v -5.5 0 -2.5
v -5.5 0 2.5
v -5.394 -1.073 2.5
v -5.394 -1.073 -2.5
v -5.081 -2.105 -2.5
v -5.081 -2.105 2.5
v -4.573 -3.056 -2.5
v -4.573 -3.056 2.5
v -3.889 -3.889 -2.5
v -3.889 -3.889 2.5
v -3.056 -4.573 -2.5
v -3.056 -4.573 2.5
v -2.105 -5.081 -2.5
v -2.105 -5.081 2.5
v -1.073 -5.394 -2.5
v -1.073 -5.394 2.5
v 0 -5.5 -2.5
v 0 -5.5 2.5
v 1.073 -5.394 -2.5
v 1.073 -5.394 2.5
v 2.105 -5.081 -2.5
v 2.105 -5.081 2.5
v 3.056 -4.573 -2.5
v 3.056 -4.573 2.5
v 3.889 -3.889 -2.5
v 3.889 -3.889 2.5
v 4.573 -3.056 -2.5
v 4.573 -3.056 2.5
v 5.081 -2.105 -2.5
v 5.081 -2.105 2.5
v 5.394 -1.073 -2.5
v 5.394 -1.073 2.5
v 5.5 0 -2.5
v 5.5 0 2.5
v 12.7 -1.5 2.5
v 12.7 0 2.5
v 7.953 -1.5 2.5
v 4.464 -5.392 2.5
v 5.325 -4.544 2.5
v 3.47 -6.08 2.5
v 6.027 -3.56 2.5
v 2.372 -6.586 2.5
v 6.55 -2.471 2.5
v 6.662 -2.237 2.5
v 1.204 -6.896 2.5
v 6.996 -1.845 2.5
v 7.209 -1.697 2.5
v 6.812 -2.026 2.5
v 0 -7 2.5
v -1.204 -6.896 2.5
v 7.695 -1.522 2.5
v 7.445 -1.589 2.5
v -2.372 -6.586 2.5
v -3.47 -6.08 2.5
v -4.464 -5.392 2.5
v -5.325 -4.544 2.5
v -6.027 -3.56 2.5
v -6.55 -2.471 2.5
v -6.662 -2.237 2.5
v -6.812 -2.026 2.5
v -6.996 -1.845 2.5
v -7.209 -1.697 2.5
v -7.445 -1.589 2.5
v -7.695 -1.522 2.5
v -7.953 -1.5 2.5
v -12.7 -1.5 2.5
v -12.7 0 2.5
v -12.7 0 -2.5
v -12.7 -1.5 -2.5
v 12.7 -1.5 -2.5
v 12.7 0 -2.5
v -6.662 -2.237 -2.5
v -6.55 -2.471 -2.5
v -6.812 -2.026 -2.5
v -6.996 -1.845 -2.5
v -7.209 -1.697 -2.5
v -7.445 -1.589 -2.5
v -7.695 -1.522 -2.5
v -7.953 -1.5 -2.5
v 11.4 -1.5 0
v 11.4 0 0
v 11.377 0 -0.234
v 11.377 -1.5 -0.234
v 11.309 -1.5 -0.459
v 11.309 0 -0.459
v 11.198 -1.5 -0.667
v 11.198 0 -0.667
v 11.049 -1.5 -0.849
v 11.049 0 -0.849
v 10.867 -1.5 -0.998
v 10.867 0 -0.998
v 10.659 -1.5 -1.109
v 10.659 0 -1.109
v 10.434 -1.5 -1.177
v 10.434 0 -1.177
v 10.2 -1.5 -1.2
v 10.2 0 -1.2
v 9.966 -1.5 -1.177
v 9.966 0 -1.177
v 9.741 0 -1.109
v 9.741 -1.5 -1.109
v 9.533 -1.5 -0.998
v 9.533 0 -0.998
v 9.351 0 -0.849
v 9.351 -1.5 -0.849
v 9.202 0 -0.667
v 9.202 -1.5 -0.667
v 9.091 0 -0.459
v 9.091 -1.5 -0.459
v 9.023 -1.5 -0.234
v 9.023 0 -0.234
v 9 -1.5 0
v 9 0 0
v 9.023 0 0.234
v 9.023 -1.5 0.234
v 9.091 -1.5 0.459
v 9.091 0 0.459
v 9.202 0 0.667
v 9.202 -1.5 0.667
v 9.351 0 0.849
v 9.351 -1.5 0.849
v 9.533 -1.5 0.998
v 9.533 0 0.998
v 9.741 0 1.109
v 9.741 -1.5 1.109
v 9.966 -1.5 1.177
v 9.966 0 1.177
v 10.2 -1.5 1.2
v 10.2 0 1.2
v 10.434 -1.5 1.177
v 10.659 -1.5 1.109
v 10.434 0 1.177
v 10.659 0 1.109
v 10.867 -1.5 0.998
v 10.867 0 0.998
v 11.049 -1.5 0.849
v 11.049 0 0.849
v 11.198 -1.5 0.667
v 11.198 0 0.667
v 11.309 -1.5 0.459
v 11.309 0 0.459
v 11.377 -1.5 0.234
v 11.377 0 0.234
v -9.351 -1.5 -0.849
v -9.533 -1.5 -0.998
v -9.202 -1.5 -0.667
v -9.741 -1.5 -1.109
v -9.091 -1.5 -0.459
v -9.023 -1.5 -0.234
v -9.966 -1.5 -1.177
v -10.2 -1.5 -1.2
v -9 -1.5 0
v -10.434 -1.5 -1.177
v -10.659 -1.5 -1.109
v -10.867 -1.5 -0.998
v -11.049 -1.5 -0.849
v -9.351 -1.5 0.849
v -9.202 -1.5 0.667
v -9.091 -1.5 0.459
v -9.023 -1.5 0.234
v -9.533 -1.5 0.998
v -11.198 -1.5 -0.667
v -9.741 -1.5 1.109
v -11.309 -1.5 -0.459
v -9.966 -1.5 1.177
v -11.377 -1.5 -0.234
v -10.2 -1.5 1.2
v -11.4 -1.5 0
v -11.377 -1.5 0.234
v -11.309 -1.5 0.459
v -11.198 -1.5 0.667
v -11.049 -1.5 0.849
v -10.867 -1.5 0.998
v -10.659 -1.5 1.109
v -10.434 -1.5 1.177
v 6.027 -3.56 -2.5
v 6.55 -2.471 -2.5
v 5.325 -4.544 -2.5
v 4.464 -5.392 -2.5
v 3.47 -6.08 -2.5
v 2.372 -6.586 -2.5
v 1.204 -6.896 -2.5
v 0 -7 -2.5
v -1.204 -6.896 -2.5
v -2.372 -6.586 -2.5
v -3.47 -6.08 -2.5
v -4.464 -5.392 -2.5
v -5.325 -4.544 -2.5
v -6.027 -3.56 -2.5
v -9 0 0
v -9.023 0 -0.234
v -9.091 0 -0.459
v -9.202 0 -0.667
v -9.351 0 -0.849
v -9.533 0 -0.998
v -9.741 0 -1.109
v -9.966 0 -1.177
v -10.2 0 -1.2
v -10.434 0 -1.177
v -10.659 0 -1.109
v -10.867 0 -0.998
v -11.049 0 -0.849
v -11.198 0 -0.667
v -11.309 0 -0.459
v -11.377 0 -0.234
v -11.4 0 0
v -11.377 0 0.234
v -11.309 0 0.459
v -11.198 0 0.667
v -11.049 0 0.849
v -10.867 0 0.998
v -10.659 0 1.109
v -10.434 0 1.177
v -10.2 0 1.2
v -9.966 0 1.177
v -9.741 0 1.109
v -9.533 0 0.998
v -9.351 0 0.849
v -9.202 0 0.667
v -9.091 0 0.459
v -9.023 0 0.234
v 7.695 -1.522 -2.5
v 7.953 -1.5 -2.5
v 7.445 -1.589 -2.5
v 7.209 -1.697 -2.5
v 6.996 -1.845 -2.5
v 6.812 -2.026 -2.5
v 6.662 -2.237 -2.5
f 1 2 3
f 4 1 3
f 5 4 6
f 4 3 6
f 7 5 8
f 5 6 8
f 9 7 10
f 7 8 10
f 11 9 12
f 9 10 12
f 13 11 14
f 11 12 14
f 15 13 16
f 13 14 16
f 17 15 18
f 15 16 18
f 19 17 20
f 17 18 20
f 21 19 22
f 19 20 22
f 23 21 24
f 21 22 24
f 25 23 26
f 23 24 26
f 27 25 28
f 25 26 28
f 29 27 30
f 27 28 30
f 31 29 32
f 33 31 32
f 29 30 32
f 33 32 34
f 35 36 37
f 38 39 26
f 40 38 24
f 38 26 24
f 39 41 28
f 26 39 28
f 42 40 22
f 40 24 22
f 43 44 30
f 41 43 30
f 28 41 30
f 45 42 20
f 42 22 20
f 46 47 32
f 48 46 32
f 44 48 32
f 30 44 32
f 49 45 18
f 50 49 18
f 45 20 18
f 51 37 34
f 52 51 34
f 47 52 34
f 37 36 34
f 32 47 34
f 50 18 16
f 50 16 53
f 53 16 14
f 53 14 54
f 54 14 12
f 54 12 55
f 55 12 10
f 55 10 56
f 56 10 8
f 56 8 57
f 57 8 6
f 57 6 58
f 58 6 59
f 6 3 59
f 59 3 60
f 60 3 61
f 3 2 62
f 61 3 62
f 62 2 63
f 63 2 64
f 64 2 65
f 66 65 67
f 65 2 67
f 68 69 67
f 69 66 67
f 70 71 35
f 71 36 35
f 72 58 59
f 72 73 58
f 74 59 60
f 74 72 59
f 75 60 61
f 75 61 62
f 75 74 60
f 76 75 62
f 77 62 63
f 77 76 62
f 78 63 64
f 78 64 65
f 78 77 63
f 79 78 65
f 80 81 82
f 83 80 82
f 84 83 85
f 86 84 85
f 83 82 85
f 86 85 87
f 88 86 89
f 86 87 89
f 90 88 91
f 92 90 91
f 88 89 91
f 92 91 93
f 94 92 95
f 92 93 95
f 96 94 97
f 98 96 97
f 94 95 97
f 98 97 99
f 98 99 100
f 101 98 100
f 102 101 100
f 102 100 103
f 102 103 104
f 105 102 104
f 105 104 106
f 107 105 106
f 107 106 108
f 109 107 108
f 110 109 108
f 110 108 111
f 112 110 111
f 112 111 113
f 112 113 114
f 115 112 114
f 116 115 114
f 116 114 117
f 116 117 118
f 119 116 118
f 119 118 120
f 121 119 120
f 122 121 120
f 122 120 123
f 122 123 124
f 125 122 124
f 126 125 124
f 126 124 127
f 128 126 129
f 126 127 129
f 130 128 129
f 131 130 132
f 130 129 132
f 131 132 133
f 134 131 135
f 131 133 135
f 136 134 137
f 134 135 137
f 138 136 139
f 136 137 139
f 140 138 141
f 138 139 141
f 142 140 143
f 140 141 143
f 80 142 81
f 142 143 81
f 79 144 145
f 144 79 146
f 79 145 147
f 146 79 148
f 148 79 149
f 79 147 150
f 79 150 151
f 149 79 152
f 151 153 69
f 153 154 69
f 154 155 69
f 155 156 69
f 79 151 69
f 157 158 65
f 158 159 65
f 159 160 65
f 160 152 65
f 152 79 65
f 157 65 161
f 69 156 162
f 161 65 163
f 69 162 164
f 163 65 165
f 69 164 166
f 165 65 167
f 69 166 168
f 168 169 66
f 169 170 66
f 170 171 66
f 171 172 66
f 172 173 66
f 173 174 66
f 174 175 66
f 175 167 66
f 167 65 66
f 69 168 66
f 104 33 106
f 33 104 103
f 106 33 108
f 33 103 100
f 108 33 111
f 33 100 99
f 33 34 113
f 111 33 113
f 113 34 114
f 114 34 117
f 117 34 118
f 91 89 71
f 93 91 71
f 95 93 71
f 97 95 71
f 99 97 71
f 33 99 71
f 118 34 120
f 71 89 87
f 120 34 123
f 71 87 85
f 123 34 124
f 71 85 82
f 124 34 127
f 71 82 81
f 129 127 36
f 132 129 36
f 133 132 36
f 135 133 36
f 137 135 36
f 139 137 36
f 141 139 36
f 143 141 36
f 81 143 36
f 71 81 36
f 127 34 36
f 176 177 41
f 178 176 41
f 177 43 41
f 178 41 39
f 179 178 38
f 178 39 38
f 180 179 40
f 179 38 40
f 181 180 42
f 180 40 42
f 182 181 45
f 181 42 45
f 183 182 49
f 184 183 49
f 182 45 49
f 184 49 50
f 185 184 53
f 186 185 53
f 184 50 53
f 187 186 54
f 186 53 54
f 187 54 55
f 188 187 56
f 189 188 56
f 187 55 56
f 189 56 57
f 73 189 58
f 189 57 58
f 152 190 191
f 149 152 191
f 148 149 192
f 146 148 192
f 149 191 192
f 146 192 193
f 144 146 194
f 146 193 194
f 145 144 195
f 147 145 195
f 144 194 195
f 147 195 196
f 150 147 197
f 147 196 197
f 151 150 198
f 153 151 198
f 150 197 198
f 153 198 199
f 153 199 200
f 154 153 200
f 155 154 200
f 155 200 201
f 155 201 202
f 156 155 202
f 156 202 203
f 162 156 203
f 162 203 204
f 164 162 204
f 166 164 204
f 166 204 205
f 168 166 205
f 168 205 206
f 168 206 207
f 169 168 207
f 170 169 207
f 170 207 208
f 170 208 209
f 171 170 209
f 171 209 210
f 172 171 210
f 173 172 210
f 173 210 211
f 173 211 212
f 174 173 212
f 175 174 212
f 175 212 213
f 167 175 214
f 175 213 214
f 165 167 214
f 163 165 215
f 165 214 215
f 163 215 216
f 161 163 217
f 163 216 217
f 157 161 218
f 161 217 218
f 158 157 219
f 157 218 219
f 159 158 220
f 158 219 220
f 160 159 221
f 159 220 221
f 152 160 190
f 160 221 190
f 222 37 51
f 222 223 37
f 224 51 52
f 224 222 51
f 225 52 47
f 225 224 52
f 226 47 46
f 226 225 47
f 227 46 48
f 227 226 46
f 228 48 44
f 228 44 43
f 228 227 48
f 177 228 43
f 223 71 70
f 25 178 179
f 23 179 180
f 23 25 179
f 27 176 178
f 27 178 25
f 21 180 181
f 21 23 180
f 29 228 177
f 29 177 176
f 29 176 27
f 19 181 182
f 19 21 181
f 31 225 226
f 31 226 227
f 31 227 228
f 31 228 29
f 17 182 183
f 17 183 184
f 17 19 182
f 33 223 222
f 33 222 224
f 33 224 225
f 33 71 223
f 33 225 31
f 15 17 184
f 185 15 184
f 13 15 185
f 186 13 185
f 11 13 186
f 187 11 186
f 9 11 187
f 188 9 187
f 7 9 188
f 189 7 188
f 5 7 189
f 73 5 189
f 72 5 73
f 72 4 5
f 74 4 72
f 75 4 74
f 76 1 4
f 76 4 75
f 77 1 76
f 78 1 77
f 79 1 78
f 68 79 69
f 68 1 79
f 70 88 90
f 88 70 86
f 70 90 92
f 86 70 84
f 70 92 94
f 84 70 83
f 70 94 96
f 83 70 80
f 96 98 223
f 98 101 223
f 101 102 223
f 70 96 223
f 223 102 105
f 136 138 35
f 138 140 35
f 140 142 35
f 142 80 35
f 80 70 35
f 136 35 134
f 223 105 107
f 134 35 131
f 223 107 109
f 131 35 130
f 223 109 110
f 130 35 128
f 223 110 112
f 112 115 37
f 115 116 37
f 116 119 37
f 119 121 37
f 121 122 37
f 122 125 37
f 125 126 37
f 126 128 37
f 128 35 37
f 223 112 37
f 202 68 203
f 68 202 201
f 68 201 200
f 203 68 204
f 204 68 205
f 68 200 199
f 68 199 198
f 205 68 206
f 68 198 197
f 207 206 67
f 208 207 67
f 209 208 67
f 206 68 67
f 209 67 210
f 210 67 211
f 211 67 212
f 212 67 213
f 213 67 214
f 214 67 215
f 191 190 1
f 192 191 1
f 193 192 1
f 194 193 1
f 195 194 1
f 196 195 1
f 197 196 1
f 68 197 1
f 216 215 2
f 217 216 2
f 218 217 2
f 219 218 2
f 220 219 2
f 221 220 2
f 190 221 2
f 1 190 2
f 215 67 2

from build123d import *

# Parameters (mm, degrees)
BOSS_EXTRUDE1_DEPTH = 2.5
SKETCH2_R           = 1.2
CUT_EXTRUDE1_DEPTH  = 8
FILLET1_R           = 1.5


with BuildPart() as part:
    # Sketch1 → Boss-Extrude1 (new body, symmetric)
    with BuildSketch(Plane.XY):
        with BuildLine():
            Line((5.5, 0), (12.7, 0))
            Line((12.7, 0), (12.7, -1.5))
            Line((12.7, -1.5), (6.837397166, -1.5))
            ThreePointArc((6.837397166, -1.5), (0, -7), (-6.837397166, -1.5))
            Line((-6.837397166, -1.5), (-12.7, -1.5))
            Line((-12.7, -1.5), (-12.7, 0))
            Line((-12.7, 0), (-5.5, 0))
            ThreePointArc((-5.5, 0), (0, -5.5), (5.5, 0))
        make_face()
    extrude(amount=BOSS_EXTRUDE1_DEPTH, both=True)

    # Sketch2 → Cut-Extrude1 (cut, through all)
    with BuildSketch(Plane(origin=(0, 0, 0), x_dir=(1, 0, 0), z_dir=(0, 1, 0))):
        with Locations((-10.2, 0)):
            Circle(SKETCH2_R)
        with Locations((10.2, 0)):
            Circle(SKETCH2_R)
    extrude(amount=-CUT_EXTRUDE1_DEPTH, mode=Mode.SUBTRACT)

    # Fillet1
    fillet1_edges = [part.edges().sort_by_distance(p)[0] for p in [
        (6.837397166, -1.5, 0),
        (-6.837397166, -1.5, 0),
    ]]
    fillet(fillet1_edges, radius=FILLET1_R)


solid = part.part
